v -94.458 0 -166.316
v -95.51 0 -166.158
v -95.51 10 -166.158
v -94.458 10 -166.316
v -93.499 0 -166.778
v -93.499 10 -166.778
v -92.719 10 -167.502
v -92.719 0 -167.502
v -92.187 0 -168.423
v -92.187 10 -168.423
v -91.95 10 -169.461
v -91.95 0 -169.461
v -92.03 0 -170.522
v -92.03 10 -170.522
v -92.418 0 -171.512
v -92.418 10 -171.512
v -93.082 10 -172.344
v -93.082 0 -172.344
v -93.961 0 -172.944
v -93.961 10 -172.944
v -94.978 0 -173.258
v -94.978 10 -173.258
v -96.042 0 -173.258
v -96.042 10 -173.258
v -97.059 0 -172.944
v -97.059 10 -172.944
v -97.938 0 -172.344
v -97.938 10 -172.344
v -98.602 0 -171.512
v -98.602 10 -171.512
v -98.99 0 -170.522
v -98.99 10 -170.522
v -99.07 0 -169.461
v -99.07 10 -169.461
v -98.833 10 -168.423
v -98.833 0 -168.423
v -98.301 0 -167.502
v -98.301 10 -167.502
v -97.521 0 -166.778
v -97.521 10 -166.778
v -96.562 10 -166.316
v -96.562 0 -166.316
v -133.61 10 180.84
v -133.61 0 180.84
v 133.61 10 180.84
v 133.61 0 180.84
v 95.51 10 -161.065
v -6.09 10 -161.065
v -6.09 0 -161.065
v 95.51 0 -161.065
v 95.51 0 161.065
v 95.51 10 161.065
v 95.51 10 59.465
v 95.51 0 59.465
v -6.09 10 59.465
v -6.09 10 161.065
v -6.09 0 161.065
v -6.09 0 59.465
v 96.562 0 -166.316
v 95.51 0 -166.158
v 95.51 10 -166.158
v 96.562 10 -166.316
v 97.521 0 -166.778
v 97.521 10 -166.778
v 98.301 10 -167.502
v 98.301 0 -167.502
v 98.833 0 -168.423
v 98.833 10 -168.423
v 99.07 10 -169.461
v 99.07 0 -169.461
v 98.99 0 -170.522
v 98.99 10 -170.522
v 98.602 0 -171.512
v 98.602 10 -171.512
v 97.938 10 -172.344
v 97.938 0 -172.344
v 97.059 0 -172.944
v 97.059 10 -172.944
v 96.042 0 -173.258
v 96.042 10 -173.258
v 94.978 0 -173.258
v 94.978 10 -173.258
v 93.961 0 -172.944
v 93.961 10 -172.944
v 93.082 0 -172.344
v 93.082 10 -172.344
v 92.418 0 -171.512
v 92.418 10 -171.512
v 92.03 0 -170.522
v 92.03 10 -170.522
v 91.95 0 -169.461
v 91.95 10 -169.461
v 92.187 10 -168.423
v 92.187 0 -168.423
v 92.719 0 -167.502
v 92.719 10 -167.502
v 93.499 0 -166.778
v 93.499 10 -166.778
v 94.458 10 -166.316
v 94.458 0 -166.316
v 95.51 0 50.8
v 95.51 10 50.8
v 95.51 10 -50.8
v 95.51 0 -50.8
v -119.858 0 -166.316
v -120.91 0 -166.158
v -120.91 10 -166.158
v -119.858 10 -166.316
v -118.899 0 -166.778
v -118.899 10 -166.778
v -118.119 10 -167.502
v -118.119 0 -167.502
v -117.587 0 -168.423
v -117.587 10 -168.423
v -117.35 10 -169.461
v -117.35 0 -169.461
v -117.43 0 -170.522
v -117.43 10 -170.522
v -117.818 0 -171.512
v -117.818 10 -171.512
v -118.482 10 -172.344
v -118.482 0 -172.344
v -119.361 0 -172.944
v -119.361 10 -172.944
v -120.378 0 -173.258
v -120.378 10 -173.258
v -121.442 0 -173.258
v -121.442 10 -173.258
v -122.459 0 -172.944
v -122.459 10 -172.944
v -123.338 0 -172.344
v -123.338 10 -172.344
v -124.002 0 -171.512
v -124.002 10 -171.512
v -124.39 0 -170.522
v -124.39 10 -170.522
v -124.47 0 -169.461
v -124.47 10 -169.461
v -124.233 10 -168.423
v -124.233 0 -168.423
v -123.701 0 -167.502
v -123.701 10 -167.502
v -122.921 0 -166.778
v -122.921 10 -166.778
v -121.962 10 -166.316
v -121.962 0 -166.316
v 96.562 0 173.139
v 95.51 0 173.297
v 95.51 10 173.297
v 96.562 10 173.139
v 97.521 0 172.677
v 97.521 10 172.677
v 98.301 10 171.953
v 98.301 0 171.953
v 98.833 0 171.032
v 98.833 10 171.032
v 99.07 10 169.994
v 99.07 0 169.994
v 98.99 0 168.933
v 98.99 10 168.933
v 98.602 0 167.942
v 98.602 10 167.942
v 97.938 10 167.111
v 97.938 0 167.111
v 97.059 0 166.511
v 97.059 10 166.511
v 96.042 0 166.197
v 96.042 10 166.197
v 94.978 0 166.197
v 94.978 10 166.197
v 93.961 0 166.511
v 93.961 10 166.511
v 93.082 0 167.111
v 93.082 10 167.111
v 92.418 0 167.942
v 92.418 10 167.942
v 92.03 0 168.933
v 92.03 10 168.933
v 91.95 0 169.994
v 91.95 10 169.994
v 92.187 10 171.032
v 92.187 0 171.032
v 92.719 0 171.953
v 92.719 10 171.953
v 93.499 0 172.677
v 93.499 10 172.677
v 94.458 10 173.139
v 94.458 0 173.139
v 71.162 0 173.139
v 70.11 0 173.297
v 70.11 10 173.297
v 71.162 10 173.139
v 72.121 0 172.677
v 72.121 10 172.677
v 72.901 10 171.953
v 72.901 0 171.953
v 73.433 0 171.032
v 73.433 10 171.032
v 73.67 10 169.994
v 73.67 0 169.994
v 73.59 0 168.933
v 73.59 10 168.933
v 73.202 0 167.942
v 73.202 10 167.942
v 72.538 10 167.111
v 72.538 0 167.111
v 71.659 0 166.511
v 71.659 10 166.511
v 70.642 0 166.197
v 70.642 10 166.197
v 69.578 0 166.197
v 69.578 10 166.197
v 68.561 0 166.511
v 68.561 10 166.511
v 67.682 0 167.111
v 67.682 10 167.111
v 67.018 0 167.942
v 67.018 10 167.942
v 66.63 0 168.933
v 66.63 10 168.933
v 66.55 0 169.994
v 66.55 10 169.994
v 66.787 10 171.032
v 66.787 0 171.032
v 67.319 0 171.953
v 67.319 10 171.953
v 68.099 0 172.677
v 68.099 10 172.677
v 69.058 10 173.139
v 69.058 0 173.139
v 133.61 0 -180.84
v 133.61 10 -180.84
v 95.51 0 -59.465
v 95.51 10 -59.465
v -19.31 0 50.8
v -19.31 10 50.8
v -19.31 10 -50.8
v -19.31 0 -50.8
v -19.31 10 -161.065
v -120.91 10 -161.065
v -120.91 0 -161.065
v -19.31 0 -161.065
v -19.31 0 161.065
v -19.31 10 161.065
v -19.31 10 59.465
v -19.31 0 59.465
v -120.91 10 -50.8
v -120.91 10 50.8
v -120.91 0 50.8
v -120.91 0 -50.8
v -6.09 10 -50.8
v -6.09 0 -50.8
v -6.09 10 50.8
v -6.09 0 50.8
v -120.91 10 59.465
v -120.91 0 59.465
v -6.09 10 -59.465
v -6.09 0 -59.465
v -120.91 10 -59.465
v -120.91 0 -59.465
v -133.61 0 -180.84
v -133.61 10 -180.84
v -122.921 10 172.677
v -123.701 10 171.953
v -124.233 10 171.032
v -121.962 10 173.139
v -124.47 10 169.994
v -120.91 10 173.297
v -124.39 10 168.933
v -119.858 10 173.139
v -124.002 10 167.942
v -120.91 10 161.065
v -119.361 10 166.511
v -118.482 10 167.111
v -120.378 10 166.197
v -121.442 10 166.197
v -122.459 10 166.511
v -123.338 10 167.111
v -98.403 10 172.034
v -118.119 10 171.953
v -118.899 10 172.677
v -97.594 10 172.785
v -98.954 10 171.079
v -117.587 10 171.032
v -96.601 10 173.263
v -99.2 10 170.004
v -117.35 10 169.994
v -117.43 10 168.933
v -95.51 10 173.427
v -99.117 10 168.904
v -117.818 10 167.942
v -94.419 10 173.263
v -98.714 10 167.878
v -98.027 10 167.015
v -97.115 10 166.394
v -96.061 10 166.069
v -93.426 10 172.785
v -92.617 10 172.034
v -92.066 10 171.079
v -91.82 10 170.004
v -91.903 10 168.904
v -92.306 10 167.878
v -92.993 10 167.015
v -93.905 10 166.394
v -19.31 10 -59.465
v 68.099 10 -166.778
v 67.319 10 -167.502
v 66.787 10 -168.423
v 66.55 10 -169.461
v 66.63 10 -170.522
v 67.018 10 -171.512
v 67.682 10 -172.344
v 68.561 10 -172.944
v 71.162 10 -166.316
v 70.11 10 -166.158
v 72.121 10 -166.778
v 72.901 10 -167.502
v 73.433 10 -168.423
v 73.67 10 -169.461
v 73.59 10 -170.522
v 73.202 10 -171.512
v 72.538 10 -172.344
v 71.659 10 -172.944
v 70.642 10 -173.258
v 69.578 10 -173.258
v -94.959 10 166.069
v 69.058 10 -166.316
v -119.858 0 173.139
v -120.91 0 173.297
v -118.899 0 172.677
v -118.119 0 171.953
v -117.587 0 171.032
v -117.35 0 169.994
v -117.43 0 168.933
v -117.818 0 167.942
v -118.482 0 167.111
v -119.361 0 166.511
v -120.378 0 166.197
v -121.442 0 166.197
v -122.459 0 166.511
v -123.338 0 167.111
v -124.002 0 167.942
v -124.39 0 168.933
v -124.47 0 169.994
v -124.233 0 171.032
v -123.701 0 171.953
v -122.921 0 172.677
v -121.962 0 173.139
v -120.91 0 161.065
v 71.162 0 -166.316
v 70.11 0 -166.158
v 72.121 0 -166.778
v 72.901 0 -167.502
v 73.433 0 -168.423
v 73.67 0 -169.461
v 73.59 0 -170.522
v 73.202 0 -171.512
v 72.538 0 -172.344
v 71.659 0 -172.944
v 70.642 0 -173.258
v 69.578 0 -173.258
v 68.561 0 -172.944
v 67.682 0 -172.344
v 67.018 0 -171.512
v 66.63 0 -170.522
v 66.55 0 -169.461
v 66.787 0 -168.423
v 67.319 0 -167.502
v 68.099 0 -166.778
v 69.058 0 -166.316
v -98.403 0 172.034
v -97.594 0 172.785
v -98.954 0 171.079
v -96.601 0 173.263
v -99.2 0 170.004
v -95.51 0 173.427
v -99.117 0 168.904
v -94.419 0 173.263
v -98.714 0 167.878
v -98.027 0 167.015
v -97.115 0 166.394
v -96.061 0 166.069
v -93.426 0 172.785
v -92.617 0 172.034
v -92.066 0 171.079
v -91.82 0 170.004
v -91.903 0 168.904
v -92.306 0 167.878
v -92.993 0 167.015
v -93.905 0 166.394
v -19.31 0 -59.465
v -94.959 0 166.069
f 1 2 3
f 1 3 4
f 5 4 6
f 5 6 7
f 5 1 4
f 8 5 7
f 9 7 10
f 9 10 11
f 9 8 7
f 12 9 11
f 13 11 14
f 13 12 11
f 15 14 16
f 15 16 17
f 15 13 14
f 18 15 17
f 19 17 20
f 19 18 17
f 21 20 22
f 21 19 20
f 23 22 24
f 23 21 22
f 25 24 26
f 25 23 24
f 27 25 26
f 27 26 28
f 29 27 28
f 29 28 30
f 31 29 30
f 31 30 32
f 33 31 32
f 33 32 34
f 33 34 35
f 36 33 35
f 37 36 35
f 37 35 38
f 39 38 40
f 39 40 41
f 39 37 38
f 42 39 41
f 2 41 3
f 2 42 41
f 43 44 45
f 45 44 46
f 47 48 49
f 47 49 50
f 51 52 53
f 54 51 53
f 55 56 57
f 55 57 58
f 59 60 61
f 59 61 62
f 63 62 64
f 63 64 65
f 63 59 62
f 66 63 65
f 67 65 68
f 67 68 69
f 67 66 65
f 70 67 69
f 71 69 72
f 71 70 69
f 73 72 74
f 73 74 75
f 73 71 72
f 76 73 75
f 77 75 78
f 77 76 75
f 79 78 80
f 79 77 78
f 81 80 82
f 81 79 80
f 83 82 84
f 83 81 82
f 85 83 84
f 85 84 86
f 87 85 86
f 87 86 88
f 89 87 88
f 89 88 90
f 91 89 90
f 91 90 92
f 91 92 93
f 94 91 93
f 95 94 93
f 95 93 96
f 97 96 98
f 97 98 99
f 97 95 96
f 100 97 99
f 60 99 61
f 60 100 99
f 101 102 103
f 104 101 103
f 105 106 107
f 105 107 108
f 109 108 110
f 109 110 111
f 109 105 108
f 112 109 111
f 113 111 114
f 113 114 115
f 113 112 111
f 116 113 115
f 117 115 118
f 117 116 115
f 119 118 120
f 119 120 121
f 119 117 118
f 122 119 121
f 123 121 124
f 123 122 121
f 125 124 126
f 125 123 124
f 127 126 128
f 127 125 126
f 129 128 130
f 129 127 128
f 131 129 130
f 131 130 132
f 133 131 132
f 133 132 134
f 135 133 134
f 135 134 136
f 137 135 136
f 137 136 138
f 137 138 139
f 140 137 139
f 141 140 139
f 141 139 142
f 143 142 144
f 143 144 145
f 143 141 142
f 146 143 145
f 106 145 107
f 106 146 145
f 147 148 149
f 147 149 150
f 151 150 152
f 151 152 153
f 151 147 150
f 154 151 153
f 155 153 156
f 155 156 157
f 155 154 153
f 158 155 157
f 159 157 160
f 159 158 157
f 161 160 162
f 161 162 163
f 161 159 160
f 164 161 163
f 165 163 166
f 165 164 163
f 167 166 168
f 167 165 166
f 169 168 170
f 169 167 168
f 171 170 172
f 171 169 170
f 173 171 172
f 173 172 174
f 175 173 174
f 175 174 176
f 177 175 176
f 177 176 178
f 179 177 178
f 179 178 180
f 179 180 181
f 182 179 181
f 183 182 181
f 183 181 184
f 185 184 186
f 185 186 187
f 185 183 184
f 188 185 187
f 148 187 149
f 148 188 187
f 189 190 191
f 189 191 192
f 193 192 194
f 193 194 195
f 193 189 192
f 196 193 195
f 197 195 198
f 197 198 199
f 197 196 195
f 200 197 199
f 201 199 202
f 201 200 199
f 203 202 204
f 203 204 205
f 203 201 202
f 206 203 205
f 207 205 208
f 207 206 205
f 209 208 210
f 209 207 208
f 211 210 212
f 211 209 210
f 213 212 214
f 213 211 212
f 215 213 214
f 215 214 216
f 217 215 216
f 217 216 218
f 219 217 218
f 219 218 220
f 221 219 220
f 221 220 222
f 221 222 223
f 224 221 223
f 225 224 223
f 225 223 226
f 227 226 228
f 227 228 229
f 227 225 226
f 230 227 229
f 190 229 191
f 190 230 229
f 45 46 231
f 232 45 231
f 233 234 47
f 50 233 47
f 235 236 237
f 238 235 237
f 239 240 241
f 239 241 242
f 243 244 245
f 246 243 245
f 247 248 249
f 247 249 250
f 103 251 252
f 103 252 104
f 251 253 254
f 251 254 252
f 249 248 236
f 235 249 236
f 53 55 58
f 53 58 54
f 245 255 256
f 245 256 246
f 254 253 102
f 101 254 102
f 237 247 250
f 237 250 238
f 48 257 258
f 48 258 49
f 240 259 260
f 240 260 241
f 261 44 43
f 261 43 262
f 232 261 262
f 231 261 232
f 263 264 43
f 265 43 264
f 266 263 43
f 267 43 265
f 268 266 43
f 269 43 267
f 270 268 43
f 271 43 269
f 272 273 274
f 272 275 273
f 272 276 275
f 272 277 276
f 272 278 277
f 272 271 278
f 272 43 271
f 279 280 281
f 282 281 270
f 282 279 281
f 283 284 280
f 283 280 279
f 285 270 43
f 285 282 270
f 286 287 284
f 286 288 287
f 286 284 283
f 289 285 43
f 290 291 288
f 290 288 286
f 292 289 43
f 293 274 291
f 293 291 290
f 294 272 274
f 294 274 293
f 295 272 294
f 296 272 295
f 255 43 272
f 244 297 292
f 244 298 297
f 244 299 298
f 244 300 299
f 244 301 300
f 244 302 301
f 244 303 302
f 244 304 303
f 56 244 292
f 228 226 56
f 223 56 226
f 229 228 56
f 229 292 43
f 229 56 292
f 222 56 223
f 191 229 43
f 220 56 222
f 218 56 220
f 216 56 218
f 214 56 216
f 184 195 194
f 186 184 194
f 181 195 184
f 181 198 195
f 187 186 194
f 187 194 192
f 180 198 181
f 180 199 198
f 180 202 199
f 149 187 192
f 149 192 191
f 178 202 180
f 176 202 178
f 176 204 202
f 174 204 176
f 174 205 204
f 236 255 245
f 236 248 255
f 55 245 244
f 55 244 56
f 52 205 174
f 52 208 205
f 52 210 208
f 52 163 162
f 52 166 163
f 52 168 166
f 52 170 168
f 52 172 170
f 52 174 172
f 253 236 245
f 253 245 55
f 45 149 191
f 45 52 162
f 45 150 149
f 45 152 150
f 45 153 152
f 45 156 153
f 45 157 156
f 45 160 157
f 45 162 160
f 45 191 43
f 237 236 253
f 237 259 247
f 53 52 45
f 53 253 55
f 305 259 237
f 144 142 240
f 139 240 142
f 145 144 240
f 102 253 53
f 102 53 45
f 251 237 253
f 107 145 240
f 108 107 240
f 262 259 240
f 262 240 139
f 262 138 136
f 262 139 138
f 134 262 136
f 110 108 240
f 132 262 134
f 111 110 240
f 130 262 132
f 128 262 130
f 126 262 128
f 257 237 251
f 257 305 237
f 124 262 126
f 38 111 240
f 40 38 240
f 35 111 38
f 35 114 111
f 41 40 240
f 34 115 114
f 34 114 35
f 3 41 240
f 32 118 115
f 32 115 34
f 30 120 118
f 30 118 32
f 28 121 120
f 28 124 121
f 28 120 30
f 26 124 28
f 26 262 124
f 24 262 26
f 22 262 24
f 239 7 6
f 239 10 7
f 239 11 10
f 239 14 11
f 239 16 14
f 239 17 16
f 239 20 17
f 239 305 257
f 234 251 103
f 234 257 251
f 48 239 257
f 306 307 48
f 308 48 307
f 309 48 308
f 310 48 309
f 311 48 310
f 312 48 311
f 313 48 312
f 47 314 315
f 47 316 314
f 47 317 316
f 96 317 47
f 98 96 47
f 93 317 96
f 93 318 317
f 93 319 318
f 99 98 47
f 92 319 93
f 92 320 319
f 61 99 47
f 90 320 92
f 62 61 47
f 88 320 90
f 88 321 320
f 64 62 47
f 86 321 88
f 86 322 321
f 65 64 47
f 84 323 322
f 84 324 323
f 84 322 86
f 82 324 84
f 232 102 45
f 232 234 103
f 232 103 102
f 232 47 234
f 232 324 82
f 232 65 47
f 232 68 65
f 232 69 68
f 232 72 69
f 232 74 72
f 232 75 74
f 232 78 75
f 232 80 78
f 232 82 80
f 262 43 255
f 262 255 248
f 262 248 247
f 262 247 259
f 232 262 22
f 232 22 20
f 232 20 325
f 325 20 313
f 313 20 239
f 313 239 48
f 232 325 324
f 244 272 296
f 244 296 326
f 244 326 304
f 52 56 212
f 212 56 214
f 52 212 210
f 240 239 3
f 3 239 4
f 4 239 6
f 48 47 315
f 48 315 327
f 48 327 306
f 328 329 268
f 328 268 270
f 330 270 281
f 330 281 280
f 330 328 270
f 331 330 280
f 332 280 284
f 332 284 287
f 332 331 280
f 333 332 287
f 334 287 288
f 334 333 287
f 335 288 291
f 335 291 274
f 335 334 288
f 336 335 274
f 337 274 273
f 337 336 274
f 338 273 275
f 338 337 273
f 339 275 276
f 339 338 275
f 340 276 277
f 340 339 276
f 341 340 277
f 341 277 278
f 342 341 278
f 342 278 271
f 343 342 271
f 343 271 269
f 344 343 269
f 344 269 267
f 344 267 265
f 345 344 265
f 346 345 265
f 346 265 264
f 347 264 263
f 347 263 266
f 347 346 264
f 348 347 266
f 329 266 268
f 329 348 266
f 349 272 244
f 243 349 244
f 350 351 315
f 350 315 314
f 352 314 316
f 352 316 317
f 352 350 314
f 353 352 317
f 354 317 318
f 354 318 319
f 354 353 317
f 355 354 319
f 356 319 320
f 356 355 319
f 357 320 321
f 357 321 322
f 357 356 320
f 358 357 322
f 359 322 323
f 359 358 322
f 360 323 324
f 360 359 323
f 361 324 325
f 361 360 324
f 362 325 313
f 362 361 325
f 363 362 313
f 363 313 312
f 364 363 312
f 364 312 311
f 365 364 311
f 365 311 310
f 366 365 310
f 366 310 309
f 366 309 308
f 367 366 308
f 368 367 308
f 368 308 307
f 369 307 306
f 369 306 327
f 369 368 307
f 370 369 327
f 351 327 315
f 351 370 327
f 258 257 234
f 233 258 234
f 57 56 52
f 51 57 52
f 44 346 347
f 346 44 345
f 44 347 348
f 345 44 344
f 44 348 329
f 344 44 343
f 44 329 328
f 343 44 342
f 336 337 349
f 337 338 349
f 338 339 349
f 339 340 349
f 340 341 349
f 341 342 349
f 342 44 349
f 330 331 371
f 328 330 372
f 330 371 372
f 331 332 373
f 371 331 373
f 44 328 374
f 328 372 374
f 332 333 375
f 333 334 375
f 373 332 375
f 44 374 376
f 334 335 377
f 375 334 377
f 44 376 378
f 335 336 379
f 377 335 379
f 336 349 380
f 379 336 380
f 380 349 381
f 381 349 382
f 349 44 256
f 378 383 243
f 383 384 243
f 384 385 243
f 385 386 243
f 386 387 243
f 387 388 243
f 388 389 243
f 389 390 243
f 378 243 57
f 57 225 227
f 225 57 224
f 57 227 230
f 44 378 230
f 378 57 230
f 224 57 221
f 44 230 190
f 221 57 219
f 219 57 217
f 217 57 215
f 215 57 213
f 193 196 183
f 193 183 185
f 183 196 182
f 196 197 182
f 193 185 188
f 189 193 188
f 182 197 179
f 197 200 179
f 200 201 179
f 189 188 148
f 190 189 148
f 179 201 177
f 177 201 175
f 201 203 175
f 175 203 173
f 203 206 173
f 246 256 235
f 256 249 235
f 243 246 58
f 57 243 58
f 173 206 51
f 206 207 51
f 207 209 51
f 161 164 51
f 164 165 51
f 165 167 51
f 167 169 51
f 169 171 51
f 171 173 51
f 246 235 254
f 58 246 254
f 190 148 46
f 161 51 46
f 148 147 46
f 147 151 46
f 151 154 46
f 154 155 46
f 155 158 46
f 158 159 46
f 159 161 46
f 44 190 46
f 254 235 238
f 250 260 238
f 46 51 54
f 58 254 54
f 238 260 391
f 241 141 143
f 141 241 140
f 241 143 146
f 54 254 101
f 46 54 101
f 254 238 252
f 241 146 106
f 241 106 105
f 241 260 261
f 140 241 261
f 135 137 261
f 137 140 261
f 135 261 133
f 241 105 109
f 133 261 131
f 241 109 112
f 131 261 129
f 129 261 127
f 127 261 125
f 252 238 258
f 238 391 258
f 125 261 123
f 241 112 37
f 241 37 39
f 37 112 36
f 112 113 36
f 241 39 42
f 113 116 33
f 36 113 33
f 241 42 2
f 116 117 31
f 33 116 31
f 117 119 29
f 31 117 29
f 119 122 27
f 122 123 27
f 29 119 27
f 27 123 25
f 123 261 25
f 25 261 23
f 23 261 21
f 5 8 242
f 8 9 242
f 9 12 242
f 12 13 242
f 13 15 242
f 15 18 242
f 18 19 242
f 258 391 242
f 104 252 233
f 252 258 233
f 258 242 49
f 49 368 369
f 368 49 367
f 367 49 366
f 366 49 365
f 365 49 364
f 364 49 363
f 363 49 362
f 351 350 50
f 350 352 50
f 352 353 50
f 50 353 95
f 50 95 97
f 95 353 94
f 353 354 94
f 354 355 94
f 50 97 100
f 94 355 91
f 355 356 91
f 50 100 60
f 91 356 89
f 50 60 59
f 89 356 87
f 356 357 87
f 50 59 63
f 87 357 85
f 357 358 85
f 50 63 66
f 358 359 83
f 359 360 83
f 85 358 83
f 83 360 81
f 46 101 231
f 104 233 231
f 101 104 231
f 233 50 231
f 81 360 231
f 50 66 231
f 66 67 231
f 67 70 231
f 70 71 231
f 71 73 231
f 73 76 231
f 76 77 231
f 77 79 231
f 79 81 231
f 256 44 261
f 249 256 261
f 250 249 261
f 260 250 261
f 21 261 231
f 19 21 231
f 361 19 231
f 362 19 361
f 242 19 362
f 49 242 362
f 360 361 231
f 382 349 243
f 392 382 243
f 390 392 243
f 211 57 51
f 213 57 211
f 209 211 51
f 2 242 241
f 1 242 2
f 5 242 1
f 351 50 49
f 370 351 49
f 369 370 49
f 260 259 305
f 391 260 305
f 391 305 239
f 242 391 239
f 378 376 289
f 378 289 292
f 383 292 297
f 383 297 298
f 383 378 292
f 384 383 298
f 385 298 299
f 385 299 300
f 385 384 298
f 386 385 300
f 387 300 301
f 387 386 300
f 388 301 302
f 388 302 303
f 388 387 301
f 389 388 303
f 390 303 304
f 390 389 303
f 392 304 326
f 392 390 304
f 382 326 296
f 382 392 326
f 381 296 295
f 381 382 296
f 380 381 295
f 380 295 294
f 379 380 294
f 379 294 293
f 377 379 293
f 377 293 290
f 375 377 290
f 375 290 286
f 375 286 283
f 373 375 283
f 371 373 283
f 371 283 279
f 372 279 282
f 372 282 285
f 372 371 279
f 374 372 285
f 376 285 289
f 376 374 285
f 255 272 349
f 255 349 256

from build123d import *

# Parameters (mm, degrees)
SKETCH1_W                 = 267.22
SKETCH1_H                 = 361.68
SKETCH1_R                 = 3.57
SKETCH1_R_2               = 3.7
BOSS_EXTRUDE1_DEPTH       = 10
SKETCH2_W                 = 101.6
SKETCH2_H                 = 101.6
CUT_EXTRUDE1_DEPTH        = 226.066074076
LPATTERN1_COUNT           = 2
LPATTERN1_PITCH           = 110.265
LPATTERN2_COUNT           = 2
LPATTERN2_PITCH           = 110.265
LPATTERN3_COUNT           = 2
LPATTERN3_PITCH           = 114.82
LPATTERN3_COPY_1_SKETCH_W = 101.6
LPATTERN3_COPY_1_SKETCH_H = 101.6
LPATTERN3_COPY_1_DEPTH    = 226.066074076
LPATTERN3_COPY_2_SKETCH_W = 101.6
LPATTERN3_COPY_2_SKETCH_H = 101.6
LPATTERN3_COPY_2_DEPTH    = 226.066074076


with BuildPart() as part:
    # Sketch1 → Boss-Extrude1 (new body)
    with BuildSketch(Plane(origin=(0, 0, 0), x_dir=(1, 0, 0), z_dir=(0, 1, 0))):
        Rectangle(SKETCH1_W, SKETCH1_H)
        with Locations(Location((-120.91, -169.7275, 0), (0, 0, 270))):
            Circle(SKETCH1_R, mode=Mode.SUBTRACT)
        with Locations(Location((-120.91, 169.7275, 0), (0, 0, 270))):
            Circle(SKETCH1_R, mode=Mode.SUBTRACT)
        with Locations(Location((70.11, 169.7275, 0), (0, 0, 270))):
            Circle(SKETCH1_R, mode=Mode.SUBTRACT)
        with Locations(Location((70.11, -169.7275, 0), (0, 0, 270))):
            Circle(SKETCH1_R, mode=Mode.SUBTRACT)
        with Locations(Location((-95.51, 169.7275, 0), (0, 0, 270))):
            Circle(SKETCH1_R, mode=Mode.SUBTRACT)
        with Locations(Location((-95.51, -169.7275, 0), (0, 0, 270))):
            Circle(SKETCH1_R_2, mode=Mode.SUBTRACT)
        with Locations(Location((95.51, 169.7275, 0), (0, 0, 270))):
            Circle(SKETCH1_R, mode=Mode.SUBTRACT)
        with Locations(Location((95.51, -169.7275, 0), (0, 0, 270))):
            Circle(SKETCH1_R, mode=Mode.SUBTRACT)
    extrude(amount=BOSS_EXTRUDE1_DEPTH)

    # Sketch2 → Cut-Extrude1 (cut, through all)
    with BuildSketch(Plane(origin=(0, 10, 0), x_dir=(1, 0, 0), z_dir=(0, 1, 0))):
        with Locations((-70.11, 0)):
            Rectangle(SKETCH2_W, SKETCH2_H)
    cut_extrude1 = extrude(amount=-CUT_EXTRUDE1_DEPTH, mode=Mode.SUBTRACT)

    # LPattern1: Cut-Extrude1 ×2
    with Locations(*[(0, 0, -i * LPATTERN1_PITCH) for i in range(1, LPATTERN1_COUNT)]):
        add(cut_extrude1, mode=Mode.SUBTRACT)

    # LPattern2: Cut-Extrude1 ×2
    with Locations(*[(0, 0, i * LPATTERN2_PITCH) for i in range(1, LPATTERN2_COUNT)]):
        add(cut_extrude1, mode=Mode.SUBTRACT)

    # LPattern3: Cut-Extrude1 ×2
    with Locations(*[(i * LPATTERN3_PITCH, 0, 0) for i in range(1, LPATTERN3_COUNT)]):
        add(cut_extrude1, mode=Mode.SUBTRACT)

    # LPattern3 copy 1 sketch → LPattern3 copy 1 (cut, through all)
    with BuildSketch(Plane(origin=(114.82, 10, -110.265), x_dir=(1, 0, 0), z_dir=(0, 1, 0))):
        with Locations((-70.11, 0)):
            Rectangle(LPATTERN3_COPY_1_SKETCH_W, LPATTERN3_COPY_1_SKETCH_H)
    extrude(amount=-LPATTERN3_COPY_1_DEPTH, mode=Mode.SUBTRACT)

    # LPattern3 copy 2 sketch → LPattern3 copy 2 (cut, through all)
    with BuildSketch(Plane(origin=(114.82, 10, 110.265), x_dir=(1, 0, 0), z_dir=(0, 1, 0))):
        with Locations((-70.11, 0)):
            Rectangle(LPATTERN3_COPY_2_SKETCH_W, LPATTERN3_COPY_2_SKETCH_H)
    extrude(amount=-LPATTERN3_COPY_2_DEPTH, mode=Mode.SUBTRACT)


solid = part.part
